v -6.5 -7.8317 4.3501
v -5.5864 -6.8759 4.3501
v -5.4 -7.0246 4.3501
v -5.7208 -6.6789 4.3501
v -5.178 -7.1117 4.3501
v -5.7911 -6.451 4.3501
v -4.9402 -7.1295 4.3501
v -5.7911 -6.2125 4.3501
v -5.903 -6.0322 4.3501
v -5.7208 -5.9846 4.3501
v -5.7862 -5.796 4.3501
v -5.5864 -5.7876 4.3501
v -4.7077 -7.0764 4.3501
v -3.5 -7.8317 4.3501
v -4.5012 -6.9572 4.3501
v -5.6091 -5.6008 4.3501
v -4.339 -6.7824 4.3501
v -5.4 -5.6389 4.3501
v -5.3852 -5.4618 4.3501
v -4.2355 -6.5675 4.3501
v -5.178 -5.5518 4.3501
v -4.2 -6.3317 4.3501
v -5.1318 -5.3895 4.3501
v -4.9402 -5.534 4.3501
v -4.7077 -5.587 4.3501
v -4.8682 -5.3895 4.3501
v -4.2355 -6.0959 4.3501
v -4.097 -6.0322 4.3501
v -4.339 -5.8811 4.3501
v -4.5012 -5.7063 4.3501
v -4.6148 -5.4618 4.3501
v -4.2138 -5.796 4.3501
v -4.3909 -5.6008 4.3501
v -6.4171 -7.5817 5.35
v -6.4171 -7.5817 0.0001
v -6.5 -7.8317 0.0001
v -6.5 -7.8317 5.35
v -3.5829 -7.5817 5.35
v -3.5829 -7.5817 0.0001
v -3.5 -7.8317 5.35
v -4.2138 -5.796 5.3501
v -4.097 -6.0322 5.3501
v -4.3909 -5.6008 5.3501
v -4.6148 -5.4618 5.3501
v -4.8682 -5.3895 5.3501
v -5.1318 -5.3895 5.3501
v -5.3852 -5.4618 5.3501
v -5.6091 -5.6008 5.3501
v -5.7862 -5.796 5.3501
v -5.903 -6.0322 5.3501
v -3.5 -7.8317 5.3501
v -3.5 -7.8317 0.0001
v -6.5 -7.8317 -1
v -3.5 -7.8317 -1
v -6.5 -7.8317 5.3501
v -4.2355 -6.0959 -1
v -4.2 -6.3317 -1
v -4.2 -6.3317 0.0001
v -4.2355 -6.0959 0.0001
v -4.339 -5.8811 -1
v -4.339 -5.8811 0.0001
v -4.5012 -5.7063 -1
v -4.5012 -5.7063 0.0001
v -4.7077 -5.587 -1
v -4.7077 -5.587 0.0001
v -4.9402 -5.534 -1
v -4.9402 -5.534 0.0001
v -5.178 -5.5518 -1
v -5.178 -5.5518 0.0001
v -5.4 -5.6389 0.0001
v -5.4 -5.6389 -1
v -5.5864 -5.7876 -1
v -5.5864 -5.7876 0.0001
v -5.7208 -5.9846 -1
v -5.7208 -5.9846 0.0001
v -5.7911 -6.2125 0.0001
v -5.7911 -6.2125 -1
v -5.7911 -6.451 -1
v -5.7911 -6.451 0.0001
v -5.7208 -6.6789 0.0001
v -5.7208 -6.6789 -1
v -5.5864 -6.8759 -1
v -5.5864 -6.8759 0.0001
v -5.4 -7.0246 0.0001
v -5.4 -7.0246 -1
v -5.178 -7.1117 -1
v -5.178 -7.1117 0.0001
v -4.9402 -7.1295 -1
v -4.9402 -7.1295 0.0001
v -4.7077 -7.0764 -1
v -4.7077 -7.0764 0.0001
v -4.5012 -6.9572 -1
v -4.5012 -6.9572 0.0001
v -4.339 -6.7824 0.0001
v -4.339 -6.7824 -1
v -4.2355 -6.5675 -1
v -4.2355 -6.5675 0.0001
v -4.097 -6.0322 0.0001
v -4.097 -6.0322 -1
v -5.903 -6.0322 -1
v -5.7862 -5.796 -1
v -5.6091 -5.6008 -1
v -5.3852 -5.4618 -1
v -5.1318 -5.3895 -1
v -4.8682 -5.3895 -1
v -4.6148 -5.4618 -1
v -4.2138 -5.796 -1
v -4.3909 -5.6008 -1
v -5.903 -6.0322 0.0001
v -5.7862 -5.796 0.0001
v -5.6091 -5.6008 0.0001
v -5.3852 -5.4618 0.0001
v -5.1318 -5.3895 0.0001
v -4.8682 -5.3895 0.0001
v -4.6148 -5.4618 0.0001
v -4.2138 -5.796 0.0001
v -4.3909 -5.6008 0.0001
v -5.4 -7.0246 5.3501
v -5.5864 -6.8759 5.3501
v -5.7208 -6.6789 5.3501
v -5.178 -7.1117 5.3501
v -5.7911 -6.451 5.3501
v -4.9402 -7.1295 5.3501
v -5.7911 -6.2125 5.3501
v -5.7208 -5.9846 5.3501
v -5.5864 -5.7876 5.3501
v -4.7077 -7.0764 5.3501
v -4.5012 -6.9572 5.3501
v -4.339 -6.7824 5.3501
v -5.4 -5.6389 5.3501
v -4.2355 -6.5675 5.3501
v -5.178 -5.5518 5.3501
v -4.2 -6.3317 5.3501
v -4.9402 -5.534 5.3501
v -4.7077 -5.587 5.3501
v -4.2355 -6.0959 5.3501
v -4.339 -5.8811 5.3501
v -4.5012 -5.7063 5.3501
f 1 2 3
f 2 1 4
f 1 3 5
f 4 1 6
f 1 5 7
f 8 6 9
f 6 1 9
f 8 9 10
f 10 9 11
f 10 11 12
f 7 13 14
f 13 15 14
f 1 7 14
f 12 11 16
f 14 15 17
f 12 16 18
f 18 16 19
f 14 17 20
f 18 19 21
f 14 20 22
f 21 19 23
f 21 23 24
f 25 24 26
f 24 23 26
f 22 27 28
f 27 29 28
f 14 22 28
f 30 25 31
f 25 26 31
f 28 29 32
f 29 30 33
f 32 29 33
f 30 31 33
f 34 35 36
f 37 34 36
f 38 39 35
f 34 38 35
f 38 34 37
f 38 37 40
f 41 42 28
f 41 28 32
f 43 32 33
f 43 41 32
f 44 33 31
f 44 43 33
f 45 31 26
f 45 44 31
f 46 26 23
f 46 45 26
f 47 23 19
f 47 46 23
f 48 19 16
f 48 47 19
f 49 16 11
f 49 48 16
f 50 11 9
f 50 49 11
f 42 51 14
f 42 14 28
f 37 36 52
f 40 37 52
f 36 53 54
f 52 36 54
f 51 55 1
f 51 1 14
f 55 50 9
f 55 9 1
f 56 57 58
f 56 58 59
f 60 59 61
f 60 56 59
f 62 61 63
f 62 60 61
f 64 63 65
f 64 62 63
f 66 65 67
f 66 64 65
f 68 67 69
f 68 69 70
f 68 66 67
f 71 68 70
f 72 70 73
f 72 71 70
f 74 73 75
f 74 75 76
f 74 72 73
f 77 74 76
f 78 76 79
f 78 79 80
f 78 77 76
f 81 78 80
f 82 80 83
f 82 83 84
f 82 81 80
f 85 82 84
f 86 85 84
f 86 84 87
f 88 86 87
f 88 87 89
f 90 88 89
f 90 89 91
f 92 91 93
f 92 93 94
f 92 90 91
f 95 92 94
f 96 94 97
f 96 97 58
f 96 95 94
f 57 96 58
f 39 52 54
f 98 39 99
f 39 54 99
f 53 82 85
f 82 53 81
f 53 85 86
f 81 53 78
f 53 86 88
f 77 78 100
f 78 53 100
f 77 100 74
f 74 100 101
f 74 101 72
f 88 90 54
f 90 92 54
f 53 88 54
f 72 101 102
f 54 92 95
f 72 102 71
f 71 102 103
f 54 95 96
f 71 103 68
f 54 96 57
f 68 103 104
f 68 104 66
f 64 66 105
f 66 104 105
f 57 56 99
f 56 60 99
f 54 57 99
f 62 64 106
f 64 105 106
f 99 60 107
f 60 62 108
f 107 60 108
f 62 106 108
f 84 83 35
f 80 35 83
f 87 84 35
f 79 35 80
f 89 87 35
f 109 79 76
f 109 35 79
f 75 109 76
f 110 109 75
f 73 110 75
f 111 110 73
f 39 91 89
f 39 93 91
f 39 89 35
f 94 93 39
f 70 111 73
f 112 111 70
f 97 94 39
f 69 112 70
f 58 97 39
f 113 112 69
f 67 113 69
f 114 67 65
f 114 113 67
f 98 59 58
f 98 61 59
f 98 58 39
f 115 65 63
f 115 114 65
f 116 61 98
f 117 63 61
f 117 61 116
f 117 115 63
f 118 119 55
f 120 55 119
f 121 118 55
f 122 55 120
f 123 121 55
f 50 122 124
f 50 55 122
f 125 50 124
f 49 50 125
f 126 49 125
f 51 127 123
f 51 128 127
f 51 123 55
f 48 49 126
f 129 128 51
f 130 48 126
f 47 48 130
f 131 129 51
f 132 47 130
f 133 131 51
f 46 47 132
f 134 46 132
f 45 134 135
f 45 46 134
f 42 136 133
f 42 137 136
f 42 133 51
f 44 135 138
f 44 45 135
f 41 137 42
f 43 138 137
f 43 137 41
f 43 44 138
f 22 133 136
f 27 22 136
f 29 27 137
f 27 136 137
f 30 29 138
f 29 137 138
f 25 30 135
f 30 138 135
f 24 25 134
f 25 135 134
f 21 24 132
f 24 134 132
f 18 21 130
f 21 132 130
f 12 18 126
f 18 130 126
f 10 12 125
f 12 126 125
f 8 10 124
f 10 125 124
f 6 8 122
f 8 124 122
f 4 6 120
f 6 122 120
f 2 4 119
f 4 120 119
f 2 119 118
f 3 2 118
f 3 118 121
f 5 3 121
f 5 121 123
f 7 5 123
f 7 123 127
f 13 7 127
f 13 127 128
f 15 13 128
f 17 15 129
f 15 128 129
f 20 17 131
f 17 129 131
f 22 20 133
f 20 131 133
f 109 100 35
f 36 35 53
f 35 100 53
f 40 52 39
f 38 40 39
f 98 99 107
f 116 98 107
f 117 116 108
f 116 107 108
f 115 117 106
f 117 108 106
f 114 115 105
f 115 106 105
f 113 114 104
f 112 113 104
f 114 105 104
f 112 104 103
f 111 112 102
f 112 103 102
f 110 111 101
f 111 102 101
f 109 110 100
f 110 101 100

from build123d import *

# Parameters (mm, degrees)
BOSS_EXTRUDE2_DEPTH      = 0.0001
BOSS_EXTRUDE2_DEPTH_BACK = 1
SKETCH5_R                = 0.8
SKETCH7_R                = 0.8
BOSS_EXTRUDE3_DEPTH      = 1
BOSS_EXTRUDE4_DEPTH      = 5.35


with BuildPart() as part:
    # Sketch5 → Boss-Extrude2 (new, two sides: drawn at the far end of the back side and taken through both)
    with BuildSketch(Plane.XY.offset(-BOSS_EXTRUDE2_DEPTH_BACK)):
        with BuildLine():
            Line((-5.903029301, -6.032181157), (-6.5, -7.831743939))
            Line((-6.5, -7.831743939), (-3.5, -7.831743939))
            Line((-3.5, -7.831743939), (-4.096970699, -6.032181157))
            ThreePointArc((-4.096970699, -6.032181157), (-5, -5.380324064), (-5.903029301, -6.032181157))
        make_face()
        with Locations((-5, -6.331743939)):
            Circle(SKETCH5_R, mode=Mode.SUBTRACT)
    extrude(amount=BOSS_EXTRUDE2_DEPTH + BOSS_EXTRUDE2_DEPTH_BACK)

    # Sketch8 → Boss-Extrude4 (add)
    with BuildSketch(Plane.XY):
        Polygon((-6.417067259, -7.581743939), (-6.5, -7.831743939), (-3.5, -7.831743939), (-3.582932741, -7.581743939), align=None)
    extrude(amount=BOSS_EXTRUDE4_DEPTH)


with BuildPart() as body_2:
    # Sketch7 → Boss-Extrude3 (new body)
    with BuildSketch(Plane.XY.offset(5.3501)):
        with BuildLine():
            Line((-5.903029301, -6.032181157), (-6.5, -7.831743939))
            Line((-6.5, -7.831743939), (-3.5, -7.831743939))
            Line((-3.5, -7.831743939), (-4.096970699, -6.032181157))
            ThreePointArc((-4.096970699, -6.032181157), (-5, -5.380324064), (-5.903029301, -6.032181157))
        make_face()
        with Locations((-5, -6.331743939)):
            Circle(SKETCH7_R, mode=Mode.SUBTRACT)
    extrude(amount=-BOSS_EXTRUDE3_DEPTH)


solid = Compound([part.part, body_2.part])
